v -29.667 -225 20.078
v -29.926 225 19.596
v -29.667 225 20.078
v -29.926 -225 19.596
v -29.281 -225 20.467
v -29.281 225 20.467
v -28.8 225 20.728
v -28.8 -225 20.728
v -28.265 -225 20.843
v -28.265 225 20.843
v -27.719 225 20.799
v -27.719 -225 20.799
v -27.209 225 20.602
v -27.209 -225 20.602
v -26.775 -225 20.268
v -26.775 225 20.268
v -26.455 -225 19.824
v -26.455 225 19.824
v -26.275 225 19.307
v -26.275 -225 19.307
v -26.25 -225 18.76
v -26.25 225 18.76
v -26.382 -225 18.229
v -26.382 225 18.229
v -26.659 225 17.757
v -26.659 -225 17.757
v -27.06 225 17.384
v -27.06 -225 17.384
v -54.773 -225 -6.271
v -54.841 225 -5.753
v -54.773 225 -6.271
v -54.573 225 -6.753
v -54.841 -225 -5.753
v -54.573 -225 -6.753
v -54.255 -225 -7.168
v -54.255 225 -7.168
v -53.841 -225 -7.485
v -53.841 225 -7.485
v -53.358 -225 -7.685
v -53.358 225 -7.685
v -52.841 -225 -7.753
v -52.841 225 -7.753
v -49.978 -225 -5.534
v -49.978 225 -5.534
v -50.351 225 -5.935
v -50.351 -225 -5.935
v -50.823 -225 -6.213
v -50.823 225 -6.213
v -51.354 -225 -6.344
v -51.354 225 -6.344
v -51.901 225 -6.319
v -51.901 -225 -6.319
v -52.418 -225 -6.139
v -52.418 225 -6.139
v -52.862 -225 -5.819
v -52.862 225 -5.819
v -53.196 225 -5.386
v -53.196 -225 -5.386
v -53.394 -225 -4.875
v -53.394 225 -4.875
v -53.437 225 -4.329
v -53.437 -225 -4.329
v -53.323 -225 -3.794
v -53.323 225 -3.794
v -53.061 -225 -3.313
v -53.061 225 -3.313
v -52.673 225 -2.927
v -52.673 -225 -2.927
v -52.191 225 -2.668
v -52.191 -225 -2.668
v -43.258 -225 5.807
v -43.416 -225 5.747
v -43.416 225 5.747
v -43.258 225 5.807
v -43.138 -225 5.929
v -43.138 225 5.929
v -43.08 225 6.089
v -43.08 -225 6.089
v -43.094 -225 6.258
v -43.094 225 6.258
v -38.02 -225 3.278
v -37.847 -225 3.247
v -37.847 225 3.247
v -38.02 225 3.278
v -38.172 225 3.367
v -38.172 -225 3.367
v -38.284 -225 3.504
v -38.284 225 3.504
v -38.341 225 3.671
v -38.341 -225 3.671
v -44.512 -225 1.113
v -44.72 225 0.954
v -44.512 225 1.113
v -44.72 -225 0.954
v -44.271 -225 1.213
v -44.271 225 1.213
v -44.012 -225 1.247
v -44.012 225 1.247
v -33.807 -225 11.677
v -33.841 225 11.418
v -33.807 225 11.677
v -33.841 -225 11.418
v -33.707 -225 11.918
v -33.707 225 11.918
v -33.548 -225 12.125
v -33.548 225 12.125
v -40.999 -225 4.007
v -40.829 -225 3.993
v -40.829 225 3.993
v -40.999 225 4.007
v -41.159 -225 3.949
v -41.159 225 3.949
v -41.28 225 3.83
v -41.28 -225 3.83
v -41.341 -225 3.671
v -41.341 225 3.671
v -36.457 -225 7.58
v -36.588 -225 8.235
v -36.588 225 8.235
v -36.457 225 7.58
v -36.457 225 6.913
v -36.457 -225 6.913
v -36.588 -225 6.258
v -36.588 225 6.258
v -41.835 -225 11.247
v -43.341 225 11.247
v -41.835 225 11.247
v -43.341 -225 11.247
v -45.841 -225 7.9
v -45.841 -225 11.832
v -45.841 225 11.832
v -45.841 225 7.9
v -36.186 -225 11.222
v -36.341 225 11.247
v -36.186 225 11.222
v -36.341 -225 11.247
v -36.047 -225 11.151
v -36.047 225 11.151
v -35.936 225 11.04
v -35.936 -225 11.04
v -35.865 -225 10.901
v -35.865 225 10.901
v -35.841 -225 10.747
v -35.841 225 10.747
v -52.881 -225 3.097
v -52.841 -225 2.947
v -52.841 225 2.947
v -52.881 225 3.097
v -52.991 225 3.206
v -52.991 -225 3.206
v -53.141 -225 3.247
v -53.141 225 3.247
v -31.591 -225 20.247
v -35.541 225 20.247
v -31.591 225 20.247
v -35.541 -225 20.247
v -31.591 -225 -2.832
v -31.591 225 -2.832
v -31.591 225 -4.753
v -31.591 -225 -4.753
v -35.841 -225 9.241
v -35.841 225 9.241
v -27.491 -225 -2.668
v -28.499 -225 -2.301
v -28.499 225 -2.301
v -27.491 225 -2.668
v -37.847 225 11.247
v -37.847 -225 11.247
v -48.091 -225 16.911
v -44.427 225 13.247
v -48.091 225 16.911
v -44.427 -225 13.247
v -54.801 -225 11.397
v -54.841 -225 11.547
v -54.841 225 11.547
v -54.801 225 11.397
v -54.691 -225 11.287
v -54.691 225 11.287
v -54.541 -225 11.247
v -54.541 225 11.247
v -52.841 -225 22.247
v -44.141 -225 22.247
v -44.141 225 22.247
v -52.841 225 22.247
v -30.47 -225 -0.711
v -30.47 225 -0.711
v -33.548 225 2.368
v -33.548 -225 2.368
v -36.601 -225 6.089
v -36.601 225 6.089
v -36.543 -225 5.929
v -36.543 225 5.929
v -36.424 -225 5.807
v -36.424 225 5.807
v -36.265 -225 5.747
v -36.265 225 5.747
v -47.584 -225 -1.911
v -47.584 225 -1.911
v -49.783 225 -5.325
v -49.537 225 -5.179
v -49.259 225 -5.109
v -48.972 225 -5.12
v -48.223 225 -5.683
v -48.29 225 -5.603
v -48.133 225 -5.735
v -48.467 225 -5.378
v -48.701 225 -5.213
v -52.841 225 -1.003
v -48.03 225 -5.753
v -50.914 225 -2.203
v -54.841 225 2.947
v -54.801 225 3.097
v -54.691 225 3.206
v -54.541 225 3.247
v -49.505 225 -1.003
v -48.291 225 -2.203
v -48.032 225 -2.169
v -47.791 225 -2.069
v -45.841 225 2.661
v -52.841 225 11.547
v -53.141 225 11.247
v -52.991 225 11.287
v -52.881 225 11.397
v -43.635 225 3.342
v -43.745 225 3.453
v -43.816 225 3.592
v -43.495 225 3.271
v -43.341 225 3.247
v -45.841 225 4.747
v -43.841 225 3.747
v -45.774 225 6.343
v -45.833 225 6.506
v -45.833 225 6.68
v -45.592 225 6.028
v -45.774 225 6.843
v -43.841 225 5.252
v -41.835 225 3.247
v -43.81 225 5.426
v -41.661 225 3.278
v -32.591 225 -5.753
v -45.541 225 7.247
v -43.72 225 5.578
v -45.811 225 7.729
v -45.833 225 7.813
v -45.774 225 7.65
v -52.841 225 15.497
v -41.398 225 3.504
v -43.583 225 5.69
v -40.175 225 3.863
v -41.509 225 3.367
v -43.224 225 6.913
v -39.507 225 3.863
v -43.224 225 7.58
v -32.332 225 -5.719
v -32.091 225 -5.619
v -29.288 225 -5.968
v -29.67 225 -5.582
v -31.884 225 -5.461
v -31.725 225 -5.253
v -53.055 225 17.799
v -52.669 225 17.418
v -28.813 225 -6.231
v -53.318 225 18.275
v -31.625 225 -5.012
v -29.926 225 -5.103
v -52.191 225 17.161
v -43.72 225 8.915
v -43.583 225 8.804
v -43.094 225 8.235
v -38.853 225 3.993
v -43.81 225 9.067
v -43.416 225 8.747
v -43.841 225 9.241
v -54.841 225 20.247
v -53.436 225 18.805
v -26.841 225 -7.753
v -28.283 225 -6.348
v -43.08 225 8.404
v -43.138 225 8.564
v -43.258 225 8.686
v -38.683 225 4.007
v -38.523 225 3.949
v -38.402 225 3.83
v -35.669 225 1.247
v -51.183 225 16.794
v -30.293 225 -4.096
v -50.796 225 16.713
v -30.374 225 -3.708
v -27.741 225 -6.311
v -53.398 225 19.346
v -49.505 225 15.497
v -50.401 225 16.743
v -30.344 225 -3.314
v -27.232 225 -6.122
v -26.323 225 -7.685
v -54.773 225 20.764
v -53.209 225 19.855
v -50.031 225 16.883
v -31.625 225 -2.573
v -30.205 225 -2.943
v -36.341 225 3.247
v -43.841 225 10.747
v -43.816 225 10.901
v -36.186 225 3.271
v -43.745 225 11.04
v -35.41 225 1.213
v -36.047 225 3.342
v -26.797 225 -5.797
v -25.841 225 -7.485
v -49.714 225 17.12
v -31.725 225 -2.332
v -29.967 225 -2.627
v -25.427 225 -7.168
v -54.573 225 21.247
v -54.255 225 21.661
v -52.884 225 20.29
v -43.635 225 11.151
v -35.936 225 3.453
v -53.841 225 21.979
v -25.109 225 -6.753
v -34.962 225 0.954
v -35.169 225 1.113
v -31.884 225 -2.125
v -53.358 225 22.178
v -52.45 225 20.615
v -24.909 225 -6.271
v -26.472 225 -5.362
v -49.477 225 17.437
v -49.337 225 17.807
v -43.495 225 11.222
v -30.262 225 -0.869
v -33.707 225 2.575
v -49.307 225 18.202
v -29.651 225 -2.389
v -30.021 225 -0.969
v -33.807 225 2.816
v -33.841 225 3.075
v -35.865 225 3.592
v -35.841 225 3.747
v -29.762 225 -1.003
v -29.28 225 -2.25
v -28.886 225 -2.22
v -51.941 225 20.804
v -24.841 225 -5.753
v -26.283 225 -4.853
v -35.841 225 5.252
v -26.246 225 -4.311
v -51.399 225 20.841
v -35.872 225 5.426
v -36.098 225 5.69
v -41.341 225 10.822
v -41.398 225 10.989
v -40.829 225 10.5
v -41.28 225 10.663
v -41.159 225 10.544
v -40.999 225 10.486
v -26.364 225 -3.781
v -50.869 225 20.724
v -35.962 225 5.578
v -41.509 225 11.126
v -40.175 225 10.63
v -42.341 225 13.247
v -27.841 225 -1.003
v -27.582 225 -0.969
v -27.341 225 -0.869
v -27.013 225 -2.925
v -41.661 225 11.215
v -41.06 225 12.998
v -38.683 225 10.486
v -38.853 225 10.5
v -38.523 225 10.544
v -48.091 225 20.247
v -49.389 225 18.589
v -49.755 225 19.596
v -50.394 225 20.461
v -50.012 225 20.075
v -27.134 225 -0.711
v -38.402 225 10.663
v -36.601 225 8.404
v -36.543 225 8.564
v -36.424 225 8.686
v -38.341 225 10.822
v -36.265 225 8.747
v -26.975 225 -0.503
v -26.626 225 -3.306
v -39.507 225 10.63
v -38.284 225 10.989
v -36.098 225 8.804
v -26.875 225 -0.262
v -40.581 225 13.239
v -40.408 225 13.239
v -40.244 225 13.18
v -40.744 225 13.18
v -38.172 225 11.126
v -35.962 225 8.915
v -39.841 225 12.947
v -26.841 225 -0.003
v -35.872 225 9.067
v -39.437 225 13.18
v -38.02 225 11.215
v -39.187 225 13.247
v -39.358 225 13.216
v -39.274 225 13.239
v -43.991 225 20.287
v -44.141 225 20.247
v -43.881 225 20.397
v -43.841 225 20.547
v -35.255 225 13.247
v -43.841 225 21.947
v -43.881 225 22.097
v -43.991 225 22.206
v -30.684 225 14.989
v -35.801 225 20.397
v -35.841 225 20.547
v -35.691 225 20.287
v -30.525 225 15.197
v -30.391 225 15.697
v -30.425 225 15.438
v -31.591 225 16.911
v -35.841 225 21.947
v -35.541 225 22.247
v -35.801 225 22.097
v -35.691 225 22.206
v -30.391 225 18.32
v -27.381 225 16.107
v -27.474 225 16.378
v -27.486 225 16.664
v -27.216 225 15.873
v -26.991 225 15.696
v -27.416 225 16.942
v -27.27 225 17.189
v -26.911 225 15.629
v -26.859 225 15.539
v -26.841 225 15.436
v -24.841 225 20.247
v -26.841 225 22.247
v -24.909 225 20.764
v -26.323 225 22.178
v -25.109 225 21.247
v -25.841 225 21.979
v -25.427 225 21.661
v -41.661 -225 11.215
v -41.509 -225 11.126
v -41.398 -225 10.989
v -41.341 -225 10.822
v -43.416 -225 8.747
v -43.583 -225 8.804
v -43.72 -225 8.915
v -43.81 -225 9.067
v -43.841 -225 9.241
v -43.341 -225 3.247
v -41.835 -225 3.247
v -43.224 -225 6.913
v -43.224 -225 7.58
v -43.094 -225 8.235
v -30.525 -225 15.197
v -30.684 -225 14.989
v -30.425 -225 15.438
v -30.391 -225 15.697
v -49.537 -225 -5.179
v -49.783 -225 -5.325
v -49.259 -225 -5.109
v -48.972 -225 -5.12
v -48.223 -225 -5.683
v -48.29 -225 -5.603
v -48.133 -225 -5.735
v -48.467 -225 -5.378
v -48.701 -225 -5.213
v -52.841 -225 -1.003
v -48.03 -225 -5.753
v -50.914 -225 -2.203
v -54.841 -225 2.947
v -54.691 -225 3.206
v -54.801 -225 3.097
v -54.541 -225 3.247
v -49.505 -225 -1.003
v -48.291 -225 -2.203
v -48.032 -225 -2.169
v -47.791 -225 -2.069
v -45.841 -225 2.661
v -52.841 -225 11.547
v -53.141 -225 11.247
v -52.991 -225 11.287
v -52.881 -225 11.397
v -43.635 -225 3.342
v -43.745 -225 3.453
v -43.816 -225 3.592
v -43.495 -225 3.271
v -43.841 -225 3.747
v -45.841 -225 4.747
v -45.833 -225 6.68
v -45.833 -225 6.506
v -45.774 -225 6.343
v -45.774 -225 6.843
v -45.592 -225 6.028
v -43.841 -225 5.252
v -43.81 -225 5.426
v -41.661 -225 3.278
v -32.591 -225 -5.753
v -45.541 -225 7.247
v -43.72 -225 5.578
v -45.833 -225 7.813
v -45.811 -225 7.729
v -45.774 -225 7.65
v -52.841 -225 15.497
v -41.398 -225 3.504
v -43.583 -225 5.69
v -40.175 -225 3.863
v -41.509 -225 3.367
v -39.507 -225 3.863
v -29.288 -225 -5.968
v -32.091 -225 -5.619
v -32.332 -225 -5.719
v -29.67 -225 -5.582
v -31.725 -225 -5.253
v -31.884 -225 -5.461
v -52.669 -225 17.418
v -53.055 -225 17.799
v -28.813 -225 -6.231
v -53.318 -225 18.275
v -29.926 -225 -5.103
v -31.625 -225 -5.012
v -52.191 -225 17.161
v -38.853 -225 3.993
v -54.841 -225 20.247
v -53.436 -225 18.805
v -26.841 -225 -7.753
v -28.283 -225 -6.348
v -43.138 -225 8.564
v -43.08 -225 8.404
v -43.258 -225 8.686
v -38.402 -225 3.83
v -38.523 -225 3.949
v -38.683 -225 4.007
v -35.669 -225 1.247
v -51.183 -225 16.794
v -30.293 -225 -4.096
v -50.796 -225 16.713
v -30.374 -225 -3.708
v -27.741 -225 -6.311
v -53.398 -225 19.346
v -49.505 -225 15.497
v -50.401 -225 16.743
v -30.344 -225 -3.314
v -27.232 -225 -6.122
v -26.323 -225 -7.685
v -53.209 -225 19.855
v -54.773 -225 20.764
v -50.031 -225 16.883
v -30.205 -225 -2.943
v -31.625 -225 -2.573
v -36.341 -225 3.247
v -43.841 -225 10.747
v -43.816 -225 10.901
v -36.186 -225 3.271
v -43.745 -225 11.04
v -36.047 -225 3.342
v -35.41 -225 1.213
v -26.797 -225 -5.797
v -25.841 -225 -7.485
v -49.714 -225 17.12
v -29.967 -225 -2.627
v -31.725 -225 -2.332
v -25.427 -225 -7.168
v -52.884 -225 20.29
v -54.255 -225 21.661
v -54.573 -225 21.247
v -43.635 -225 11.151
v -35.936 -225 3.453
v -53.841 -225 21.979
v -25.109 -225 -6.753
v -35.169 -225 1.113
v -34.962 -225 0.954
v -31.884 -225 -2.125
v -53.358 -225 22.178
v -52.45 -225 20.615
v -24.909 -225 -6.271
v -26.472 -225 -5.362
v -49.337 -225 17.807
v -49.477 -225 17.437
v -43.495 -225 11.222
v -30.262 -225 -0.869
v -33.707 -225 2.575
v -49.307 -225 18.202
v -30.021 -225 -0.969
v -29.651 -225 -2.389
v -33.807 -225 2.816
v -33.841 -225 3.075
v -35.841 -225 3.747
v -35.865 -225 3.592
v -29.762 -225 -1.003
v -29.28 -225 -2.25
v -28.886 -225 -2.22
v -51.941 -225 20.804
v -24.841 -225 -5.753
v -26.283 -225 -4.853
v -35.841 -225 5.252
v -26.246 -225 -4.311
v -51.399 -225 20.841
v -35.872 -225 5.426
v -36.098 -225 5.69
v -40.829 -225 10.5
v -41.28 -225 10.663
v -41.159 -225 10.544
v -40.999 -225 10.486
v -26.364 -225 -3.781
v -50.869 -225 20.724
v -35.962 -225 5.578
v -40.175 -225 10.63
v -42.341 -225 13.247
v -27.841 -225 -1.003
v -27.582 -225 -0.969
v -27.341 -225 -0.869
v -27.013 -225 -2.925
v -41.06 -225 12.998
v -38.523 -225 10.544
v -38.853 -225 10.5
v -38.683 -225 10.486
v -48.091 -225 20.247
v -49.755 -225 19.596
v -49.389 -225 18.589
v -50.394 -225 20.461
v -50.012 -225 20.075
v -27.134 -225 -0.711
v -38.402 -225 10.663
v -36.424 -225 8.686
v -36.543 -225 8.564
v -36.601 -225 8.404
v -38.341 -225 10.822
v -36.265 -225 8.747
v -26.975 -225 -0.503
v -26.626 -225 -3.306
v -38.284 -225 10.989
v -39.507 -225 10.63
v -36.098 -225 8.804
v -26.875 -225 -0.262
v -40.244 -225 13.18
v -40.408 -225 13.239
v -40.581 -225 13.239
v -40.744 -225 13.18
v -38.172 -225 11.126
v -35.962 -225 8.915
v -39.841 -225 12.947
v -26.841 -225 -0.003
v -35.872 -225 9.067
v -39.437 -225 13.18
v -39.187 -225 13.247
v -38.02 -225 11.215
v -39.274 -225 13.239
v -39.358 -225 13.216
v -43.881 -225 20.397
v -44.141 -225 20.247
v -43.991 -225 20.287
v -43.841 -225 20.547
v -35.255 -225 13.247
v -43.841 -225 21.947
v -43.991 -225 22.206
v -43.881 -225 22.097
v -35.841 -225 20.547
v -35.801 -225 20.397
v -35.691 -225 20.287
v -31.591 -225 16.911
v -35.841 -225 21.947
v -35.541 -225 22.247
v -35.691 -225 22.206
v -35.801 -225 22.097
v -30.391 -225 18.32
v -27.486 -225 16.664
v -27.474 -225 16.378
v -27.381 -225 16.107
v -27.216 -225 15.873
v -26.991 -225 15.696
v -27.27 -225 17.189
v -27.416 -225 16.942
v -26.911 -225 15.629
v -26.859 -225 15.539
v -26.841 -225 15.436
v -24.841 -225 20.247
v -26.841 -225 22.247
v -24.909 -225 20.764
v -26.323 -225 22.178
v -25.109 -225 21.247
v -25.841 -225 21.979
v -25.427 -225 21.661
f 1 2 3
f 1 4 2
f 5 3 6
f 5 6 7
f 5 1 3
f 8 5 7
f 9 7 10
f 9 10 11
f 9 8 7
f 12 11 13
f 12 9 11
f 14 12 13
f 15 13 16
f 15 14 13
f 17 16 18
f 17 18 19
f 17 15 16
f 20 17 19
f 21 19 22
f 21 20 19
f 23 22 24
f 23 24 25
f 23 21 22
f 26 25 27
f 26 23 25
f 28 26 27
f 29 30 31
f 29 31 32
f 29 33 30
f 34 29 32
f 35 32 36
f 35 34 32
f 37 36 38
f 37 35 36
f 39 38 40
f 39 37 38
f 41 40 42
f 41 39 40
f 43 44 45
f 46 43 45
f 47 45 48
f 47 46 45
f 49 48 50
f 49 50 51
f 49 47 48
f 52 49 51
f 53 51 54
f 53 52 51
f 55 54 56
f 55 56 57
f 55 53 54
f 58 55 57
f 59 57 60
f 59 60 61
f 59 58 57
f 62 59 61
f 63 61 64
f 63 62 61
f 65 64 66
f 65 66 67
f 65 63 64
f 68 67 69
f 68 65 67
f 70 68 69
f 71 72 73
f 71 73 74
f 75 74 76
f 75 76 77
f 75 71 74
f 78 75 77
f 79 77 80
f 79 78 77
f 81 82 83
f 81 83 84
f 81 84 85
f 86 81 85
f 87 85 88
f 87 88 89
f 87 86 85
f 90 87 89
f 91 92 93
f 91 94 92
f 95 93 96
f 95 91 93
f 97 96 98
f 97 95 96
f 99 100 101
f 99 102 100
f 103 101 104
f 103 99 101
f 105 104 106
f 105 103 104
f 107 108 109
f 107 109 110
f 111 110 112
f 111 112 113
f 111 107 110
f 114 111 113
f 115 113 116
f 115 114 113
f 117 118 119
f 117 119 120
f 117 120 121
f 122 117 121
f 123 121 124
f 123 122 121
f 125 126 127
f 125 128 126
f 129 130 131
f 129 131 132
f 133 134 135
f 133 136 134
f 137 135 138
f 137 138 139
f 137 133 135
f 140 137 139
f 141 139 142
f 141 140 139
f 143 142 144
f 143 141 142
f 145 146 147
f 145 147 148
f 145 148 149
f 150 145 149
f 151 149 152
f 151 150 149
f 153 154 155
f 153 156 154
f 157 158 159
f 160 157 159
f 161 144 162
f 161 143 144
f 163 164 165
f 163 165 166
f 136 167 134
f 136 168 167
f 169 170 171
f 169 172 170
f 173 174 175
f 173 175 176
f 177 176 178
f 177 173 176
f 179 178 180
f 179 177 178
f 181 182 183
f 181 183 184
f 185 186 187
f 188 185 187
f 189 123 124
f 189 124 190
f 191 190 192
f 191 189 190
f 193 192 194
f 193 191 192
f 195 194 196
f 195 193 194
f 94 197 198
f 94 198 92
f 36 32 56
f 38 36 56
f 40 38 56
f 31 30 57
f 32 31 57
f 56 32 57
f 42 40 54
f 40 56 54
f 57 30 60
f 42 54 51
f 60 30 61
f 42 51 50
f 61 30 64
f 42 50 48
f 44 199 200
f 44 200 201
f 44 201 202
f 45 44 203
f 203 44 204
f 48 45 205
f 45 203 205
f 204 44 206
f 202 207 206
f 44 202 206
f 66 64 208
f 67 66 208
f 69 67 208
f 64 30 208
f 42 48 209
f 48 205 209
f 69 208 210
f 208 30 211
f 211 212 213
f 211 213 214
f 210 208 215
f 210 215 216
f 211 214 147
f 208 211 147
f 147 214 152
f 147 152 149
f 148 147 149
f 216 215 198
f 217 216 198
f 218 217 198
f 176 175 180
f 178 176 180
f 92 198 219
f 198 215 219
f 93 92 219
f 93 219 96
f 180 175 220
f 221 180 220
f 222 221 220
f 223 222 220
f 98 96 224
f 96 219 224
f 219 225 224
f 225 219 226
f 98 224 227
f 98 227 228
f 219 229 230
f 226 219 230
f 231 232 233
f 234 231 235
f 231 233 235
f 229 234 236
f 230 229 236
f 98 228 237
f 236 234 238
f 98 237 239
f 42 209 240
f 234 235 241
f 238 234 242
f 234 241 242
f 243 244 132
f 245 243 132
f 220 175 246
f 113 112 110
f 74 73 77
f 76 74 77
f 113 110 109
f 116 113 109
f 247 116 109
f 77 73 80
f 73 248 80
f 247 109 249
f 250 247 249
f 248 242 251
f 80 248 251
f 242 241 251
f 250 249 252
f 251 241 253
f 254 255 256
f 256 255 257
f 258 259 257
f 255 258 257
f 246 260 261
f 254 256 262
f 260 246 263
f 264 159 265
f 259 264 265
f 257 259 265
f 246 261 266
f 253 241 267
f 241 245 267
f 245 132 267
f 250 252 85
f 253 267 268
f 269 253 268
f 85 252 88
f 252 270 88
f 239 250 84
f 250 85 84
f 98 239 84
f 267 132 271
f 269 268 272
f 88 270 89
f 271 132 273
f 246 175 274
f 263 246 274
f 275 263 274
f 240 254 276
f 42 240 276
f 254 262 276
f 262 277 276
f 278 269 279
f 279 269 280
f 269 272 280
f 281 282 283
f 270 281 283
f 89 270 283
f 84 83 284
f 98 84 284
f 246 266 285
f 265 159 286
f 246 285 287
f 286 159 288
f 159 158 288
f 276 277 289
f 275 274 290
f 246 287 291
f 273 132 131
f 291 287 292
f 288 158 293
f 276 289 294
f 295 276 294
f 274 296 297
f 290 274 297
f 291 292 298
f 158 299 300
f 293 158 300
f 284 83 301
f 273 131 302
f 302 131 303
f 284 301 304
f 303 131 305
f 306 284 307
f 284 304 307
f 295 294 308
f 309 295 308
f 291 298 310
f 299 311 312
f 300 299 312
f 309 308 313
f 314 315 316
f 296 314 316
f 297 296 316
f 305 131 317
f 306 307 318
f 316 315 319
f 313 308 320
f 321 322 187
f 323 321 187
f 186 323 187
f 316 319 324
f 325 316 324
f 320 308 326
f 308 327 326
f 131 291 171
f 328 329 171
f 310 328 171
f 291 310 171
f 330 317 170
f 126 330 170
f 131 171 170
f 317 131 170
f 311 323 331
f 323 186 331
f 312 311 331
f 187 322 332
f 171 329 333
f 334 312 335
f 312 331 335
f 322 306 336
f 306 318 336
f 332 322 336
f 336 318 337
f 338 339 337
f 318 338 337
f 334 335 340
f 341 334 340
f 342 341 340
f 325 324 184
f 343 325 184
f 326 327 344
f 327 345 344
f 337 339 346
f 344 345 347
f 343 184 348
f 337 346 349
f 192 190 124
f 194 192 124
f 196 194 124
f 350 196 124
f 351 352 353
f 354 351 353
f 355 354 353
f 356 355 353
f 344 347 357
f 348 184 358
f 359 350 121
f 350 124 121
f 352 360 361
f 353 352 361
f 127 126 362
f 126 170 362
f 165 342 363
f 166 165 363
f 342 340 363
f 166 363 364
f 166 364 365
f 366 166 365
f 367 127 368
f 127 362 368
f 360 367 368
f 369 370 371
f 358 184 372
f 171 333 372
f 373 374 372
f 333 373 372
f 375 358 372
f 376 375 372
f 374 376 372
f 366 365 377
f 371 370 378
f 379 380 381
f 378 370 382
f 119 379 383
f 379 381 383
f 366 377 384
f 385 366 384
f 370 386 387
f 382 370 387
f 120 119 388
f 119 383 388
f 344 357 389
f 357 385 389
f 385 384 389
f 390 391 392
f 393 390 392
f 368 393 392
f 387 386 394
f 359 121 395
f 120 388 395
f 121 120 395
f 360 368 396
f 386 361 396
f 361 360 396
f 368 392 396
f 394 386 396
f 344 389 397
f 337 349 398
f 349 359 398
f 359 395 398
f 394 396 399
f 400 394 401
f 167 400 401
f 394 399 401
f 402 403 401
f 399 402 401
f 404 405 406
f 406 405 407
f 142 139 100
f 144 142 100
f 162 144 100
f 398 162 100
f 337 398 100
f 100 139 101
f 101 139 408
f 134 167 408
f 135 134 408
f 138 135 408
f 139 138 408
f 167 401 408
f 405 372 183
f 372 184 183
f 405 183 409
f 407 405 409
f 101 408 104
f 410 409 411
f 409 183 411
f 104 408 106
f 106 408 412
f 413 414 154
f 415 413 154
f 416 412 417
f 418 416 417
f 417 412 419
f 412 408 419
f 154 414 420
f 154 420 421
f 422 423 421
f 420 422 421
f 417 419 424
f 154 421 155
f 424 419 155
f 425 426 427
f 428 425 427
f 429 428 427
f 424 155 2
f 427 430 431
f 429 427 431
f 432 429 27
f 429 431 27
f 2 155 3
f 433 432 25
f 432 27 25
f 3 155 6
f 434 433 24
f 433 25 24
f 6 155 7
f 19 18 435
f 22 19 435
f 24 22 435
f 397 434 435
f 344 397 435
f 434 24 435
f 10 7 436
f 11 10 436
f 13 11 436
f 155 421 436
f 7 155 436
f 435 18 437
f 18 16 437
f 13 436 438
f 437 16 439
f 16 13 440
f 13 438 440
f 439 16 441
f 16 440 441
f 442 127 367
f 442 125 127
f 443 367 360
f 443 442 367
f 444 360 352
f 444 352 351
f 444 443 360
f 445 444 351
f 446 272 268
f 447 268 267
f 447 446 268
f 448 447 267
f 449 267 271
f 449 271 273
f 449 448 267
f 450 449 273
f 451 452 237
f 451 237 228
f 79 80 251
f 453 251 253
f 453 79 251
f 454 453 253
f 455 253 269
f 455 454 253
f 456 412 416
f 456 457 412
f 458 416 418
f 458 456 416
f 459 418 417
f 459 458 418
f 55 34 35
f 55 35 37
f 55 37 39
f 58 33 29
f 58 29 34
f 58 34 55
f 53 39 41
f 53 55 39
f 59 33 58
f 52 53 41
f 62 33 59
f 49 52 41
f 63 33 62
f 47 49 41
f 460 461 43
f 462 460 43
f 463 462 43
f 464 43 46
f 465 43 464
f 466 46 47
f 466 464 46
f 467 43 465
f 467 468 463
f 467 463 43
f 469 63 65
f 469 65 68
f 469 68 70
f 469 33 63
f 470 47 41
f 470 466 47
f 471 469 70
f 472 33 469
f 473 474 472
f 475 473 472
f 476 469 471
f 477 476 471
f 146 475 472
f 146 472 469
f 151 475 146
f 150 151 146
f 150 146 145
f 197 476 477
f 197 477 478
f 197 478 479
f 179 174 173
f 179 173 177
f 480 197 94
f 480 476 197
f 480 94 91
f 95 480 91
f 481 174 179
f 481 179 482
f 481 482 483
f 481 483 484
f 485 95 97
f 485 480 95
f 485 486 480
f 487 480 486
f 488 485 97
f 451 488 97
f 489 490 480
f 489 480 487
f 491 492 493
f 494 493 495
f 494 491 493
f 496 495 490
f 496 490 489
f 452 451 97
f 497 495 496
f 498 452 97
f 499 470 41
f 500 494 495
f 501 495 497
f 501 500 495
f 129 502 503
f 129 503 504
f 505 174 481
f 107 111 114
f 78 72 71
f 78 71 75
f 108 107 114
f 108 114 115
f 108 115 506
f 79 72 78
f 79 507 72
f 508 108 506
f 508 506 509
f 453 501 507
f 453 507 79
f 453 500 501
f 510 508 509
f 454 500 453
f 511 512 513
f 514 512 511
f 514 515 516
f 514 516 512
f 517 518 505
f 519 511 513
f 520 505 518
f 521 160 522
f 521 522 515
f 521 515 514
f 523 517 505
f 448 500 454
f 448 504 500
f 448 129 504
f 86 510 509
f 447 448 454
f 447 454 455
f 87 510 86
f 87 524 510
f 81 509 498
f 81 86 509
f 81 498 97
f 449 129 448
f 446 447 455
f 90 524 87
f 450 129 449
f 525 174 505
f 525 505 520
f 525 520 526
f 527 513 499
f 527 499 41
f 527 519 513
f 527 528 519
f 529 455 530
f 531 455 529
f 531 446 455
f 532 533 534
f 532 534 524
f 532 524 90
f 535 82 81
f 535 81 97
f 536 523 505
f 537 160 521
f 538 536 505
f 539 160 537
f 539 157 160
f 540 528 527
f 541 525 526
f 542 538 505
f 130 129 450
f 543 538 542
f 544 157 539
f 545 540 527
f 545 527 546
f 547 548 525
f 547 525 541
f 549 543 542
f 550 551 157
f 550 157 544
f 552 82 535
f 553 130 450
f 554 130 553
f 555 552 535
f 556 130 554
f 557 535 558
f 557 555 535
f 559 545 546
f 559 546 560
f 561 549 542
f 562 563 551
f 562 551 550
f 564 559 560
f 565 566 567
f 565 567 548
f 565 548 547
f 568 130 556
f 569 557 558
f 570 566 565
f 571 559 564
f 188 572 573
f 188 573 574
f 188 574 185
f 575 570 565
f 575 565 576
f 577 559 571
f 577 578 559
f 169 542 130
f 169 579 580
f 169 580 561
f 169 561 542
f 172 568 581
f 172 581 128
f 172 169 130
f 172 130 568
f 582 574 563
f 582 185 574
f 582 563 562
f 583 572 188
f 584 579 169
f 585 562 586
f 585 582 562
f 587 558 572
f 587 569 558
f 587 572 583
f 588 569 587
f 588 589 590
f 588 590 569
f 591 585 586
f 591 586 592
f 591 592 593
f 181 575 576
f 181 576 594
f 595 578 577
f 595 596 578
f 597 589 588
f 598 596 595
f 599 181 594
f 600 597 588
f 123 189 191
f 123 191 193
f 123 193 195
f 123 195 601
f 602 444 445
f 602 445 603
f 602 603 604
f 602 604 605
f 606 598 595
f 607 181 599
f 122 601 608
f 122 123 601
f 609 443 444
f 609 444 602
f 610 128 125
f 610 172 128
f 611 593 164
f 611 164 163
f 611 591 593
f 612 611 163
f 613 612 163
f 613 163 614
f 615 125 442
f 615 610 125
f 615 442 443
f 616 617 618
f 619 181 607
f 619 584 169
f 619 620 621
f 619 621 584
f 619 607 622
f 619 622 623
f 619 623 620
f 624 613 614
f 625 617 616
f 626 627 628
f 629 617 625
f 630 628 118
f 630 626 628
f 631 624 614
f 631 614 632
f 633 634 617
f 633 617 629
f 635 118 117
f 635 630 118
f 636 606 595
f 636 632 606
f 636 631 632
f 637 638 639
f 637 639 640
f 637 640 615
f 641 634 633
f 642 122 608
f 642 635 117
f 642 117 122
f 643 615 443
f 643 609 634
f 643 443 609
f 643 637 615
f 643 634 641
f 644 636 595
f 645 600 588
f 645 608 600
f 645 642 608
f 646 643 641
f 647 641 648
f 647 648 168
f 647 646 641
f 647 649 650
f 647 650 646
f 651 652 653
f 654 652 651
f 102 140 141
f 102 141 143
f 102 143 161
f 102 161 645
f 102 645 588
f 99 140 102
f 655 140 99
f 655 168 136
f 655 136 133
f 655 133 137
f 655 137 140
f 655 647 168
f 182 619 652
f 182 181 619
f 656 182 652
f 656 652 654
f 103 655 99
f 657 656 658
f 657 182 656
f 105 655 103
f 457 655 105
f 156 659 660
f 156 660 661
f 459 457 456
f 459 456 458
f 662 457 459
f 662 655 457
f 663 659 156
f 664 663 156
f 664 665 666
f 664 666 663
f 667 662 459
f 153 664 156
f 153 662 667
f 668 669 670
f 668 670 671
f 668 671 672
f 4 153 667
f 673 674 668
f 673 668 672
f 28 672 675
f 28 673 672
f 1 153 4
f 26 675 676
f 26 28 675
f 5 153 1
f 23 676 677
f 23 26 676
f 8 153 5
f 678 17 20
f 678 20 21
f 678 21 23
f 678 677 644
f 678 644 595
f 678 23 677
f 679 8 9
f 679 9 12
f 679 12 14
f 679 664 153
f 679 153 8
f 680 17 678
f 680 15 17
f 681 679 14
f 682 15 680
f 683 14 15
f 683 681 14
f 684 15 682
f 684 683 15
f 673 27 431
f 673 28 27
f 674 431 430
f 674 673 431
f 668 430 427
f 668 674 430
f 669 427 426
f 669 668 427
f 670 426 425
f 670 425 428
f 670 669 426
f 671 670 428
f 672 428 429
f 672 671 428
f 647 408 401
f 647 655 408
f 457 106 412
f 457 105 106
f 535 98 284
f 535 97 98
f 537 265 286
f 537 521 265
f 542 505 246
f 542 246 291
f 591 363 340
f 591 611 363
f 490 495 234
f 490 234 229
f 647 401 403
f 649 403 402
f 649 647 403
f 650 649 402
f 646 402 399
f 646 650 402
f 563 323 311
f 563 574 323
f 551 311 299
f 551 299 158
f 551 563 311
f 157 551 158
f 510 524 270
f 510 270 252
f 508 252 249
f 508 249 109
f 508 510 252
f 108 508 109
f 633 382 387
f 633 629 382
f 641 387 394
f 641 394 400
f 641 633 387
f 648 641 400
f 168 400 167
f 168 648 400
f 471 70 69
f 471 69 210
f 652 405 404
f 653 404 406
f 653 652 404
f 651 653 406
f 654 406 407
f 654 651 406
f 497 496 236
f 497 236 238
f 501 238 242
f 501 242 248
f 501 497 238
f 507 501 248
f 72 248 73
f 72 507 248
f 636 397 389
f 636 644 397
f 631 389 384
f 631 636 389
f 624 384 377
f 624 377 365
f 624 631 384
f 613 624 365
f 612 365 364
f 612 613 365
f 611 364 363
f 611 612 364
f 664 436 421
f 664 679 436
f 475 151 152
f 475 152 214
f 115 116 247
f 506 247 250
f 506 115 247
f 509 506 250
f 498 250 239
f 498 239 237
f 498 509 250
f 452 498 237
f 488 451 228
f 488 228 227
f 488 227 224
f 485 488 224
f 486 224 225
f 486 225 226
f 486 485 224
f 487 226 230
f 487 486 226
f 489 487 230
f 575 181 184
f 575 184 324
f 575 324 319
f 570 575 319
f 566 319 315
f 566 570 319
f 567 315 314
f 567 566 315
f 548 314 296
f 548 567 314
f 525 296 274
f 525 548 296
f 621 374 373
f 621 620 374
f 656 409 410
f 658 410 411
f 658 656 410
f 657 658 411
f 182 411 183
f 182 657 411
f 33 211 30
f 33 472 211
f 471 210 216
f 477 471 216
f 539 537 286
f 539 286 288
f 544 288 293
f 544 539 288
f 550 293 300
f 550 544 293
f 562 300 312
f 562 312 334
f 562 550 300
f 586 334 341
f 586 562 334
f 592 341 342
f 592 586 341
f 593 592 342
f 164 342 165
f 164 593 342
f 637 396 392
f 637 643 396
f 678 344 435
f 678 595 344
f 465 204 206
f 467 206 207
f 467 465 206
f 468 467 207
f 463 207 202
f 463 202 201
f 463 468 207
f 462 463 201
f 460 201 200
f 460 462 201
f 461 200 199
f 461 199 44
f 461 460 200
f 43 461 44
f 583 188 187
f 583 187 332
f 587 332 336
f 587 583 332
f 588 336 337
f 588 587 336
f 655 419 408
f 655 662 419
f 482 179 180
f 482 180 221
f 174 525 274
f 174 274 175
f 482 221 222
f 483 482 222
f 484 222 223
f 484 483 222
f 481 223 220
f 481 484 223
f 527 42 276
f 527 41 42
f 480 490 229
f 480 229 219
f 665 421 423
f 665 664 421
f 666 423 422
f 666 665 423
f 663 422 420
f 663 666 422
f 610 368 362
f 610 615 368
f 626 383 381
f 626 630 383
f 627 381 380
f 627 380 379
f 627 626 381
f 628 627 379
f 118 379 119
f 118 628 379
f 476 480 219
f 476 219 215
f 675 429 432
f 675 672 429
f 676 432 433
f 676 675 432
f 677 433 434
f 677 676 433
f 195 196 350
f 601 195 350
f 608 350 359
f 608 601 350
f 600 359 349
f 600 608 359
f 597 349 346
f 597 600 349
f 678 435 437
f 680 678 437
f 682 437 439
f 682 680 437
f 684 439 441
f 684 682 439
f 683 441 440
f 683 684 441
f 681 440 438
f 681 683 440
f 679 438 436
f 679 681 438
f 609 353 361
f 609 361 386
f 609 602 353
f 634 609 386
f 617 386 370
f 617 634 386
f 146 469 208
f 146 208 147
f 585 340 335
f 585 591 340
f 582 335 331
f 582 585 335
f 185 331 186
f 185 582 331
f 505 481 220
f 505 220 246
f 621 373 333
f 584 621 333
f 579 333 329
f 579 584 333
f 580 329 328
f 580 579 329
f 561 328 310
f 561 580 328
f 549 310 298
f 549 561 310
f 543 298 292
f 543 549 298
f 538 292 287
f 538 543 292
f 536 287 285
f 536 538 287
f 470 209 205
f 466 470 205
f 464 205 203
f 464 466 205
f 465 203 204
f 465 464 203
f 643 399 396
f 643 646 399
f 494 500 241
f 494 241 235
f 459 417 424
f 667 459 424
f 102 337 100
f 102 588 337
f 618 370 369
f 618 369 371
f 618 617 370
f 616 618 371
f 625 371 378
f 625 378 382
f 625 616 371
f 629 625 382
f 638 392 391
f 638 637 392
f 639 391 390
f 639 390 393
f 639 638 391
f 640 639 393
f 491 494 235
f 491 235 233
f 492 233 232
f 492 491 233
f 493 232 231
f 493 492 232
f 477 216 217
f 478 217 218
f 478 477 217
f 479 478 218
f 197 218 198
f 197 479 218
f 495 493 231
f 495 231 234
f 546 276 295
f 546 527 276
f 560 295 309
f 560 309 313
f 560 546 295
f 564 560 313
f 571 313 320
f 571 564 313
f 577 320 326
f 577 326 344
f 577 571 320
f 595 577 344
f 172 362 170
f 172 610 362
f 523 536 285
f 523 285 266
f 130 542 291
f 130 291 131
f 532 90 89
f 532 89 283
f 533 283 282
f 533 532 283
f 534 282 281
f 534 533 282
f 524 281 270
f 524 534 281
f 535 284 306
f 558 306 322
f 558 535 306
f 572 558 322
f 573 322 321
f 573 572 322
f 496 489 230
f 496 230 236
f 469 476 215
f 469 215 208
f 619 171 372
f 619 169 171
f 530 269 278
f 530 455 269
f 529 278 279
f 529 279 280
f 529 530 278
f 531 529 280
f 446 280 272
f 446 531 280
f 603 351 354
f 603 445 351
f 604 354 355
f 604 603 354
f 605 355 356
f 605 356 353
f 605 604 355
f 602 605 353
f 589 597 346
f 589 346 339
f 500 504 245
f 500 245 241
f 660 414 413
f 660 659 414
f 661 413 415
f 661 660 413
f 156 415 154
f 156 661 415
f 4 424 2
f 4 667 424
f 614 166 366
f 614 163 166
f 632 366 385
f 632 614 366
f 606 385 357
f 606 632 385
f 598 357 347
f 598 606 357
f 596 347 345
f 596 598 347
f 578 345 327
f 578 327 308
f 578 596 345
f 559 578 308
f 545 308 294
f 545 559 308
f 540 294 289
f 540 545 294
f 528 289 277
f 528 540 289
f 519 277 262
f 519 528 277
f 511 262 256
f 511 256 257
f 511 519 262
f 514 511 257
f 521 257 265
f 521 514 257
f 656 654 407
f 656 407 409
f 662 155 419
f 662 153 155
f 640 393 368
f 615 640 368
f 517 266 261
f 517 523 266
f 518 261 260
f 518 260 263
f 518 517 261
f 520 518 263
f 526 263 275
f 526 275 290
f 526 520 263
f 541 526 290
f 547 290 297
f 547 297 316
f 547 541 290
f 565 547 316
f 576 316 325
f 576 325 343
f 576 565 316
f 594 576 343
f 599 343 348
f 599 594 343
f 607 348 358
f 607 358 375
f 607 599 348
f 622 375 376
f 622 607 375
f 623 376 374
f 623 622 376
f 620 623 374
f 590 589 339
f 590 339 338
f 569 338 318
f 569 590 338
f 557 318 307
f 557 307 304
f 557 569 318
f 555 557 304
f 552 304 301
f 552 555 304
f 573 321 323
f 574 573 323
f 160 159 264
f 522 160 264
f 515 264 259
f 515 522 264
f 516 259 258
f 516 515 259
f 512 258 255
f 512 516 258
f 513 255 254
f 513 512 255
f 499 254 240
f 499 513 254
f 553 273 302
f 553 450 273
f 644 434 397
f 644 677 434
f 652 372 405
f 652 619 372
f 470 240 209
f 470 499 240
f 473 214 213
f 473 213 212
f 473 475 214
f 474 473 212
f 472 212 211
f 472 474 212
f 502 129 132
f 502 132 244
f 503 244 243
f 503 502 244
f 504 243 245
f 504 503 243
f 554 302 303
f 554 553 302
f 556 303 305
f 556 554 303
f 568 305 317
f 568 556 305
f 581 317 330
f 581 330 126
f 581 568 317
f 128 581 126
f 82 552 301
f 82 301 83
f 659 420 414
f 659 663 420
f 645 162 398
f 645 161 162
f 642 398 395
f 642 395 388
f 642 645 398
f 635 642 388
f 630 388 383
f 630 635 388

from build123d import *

# Parameters (mm, degrees)
F2_DEPTH = 225


# Not quite as in the source:
# - ends of sketch curves that miss each other by under 0.0002 mm in the source are joined


with BuildPart() as f2:
    # F1 (on Front) → F2 (new body, symmetric)
    with BuildSketch(Plane.XZ):
        with BuildLine():
            Line((-48.090856, 20.246586), (-44.140856, 20.246586))
            ThreePointArc((-44.140856, 20.246586), (-43.9287239656, 20.3344539656), (-43.840856, 20.546586))
            Line((-43.840856, 20.546586), (-43.840856, 21.946586))
            ThreePointArc((-43.840856, 21.946586), (-43.9287239656, 22.1587180344), (-44.140856, 22.246586))
            Line((-44.140856, 22.246586), (-52.840856, 22.246586))
            ThreePointArc((-52.840856, 22.246586), (-54.2550695624, 21.6607995624), (-54.840856, 20.246586))
            Line((-54.840856, 20.246586), (-54.840856, 11.546586))
            ThreePointArc((-54.840856, 11.546586), (-54.7529880344, 11.3344539656), (-54.540856, 11.246586))
            Line((-54.540856, 11.246586), (-53.140856, 11.246586))
            ThreePointArc((-53.140856, 11.246586), (-52.9287239656, 11.3344539656), (-52.840856, 11.546586))
            Line((-52.840856, 11.546586), (-52.840856, 15.496586))
            Line((-52.840856, 15.496586), (-49.50507, 15.496586))
            Line((-49.50507, 15.496586), (-45.840856, 11.832372))
            Line((-45.840856, 11.832372), (-45.840856, 7.900176))
            ThreePointArc((-45.840856, 7.900176), (-45.8238189324, 7.7707665494), (-45.7738687764, 7.6501761291))
            Line((-45.7738687764, 7.6501761291), (-45.540856, 7.246586))
            Line((-45.540856, 7.246586), (-45.773869, 6.842996))
            ThreePointArc((-45.773869, 6.842996), (-45.840856, 6.592996), (-45.7738687764, 6.3429961291))
            Line((-45.7738687764, 6.3429961291), (-45.591833, 6.0277))
            Line((-45.591833, 6.0277), (-45.840856, 4.746586))
            Line((-45.840856, 4.746586), (-45.840856, 2.6608))
            Line((-45.840856, 2.6608), (-49.50507, -1.003414))
            Line((-49.50507, -1.003414), (-52.840856, -1.003414))
            Line((-52.840856, -1.003414), (-52.840856, 2.946586))
            ThreePointArc((-52.840856, 2.946586), (-52.9287239656, 3.1587180344), (-53.140856, 3.246586))
            Line((-53.140856, 3.246586), (-54.540856, 3.246586))
            ThreePointArc((-54.540856, 3.246586), (-54.7529880344, 3.1587180344), (-54.840856, 2.946586))
            Line((-54.840856, 2.946586), (-54.840856, -5.753414))
            ThreePointArc((-54.840856, -5.753414), (-54.2550695624, -7.1676275624), (-52.840856, -7.753414))
            Line((-52.840856, -7.753414), (-26.840856, -7.753414))
            ThreePointArc((-26.840856, -7.753414), (-25.4266424376, -7.1676275624), (-24.840856, -5.753414))
            Line((-24.840856, -5.753414), (-24.840856, 20.246586))
            ThreePointArc((-24.840856, 20.246586), (-25.4266424376, 21.6607995624), (-26.840856, 22.246586))
            Line((-26.840856, 22.246586), (-35.540856, 22.246586))
            ThreePointArc((-35.540856, 22.246586), (-35.7529880344, 22.1587180344), (-35.840856, 21.946586))
            Line((-35.840856, 21.946586), (-35.840856, 20.546586))
            ThreePointArc((-35.840856, 20.546586), (-35.7529880344, 20.3344539656), (-35.540856, 20.246586))
            Line((-35.540856, 20.246586), (-31.590856, 20.246586))
            Line((-31.590856, 20.246586), (-31.590856, 16.9108))
            Line((-31.590856, 16.9108), (-35.25507, 13.246586))
            Line((-35.25507, 13.246586), (-39.187266, 13.246586))
            ThreePointArc((-39.187266, 13.246586), (-39.3166754506, 13.2295489324), (-39.4372658709, 13.1795987764))
            Line((-39.4372658709, 13.1795987764), (-39.840856, 12.946586))
            Line((-39.840856, 12.946586), (-40.244446, 13.179599))
            ThreePointArc((-40.244446, 13.179599), (-40.494446, 13.246586), (-40.7444458709, 13.1795987764))
            Line((-40.7444458709, 13.1795987764), (-41.059742, 12.997563))
            Line((-41.059742, 12.997563), (-42.340856, 13.246586))
            Line((-42.340856, 13.246586), (-44.426642, 13.246586))
            Line((-44.426642, 13.246586), (-48.090856, 16.9108))
            Line((-48.090856, 16.9108), (-48.090856, 20.246586))
        make_face()
        with BuildLine():
            ThreePointArc((-48.030175, -5.753414), (-48.180175082, -5.7132215738), (-48.2899827159, -5.6034138359))
            ThreePointArc((-48.2899827159, -5.6034138359), (-49.1151948384, -5.1042472042), (-49.9783690315, -5.5344479782))
            ThreePointArc((-49.9783690315, -5.5344479782), (-53.0449723505, -5.6142903949), (-52.1906940253, -2.6679979306))
            Line((-52.1906940253, -2.6679979306), (-50.91426, -2.203414))
            Line((-50.91426, -2.203414), (-48.290856, -2.203414))
            ThreePointArc((-48.290856, -2.203414), (-47.9081725676, -2.1272935325), (-47.5837492188, -1.9105207812))
            Line((-47.5837492188, -1.9105207812), (-44.719536, 0.953693))
            ThreePointArc((-44.719536, 0.953693), (-44.3951124324, 1.1704655325), (-44.012429, 1.246586))
            Line((-44.012429, 1.246586), (-35.669283, 1.246586))
            ThreePointArc((-35.669283, 1.246586), (-35.2865995676, 1.1704655325), (-34.9621762188, 0.9536927812))
            Line((-34.9621762188, 0.9536927812), (-31.883749, -2.124734))
            ThreePointArc((-31.883749, -2.124734), (-31.6669764675, -2.4491575676), (-31.590856, -2.831841))
            Line((-31.590856, -2.831841), (-31.590856, -4.753414))
            ThreePointArc((-31.590856, -4.753414), (-31.8837492188, -5.4605207812), (-32.590856, -5.753414))
            Line((-32.590856, -5.753414), (-48.030175, -5.753414))
        make_face(mode=Mode.SUBTRACT)
        with BuildLine():
            ThreePointArc((-30.2930043339, -4.0956641215), (-29.9673844937, -2.6268855063), (-28.4986058785, -2.3012656661))
            Line((-28.4986058785, -2.3012656661), (-27.491018, -2.667998))
            ThreePointArc((-27.491018, -2.667998), (-26.7973531157, -5.7969168843), (-29.9262720694, -5.1032520253))
            Line((-29.9262720694, -5.1032520253), (-30.2930043339, -4.0956641215))
        make_face(mode=Mode.SUBTRACT)
        with BuildLine():
            ThreePointArc((-36.5876690145, 8.2349049956), (-36.440856, 7.246586), (-36.5876690145, 6.2582670044))
            ThreePointArc((-36.5876690145, 6.2582670044), (-36.5433888407, 5.9288023569), (-36.2653470651, 5.7465855742))
            ThreePointArc((-36.2653470651, 5.7465855742), (-35.9615444769, 5.5780848975), (-35.840856, 5.25232))
            Line((-35.840856, 5.25232), (-35.840856, 3.746586))
            ThreePointArc((-35.840856, 3.746586), (-35.9873026094, 3.3930326094), (-36.340856, 3.246586))
            Line((-36.340856, 3.246586), (-37.84659, 3.246586))
            ThreePointArc((-37.84659, 3.246586), (-38.1723548975, 3.3672744769), (-38.3408555178, 3.6710770737))
            ThreePointArc((-38.3408555178, 3.6710770737), (-38.5230723569, 3.9491188407), (-38.8525409519, 3.9933978415))
            ThreePointArc((-38.8525409519, 3.9933978415), (-39.840856, 3.846586), (-40.8291749956, 3.9933990145))
            ThreePointArc((-40.8291749956, 3.9933990145), (-41.1586396431, 3.9491188407), (-41.3408564258, 3.6710770651))
            ThreePointArc((-41.3408564258, 3.6710770651), (-41.5093571025, 3.3672744769), (-41.835122, 3.246586))
            Line((-41.835122, 3.246586), (-43.340856, 3.246586))
            ThreePointArc((-43.340856, 3.246586), (-43.6944093906, 3.3930326094), (-43.840856, 3.746586))
            Line((-43.840856, 3.746586), (-43.840856, 5.25232))
            ThreePointArc((-43.840856, 5.25232), (-43.7201675231, 5.5780848975), (-43.4163649263, 5.7465855178))
            ThreePointArc((-43.4163649263, 5.7465855178), (-43.1383231593, 5.9288023569), (-43.0940441585, 6.2582709519))
            ThreePointArc((-43.0940441585, 6.2582709519), (-43.240856, 7.246586), (-43.0940429855, 8.2349049956))
            ThreePointArc((-43.0940429855, 8.2349049956), (-43.1383231593, 8.5643696431), (-43.4163649349, 8.7465864258))
            ThreePointArc((-43.4163649349, 8.7465864258), (-43.7201675231, 8.9150871025), (-43.840856, 9.240852))
            Line((-43.840856, 9.240852), (-43.840856, 10.746586))
            ThreePointArc((-43.840856, 10.746586), (-43.6944093906, 11.1001393906), (-43.340856, 11.246586))
            Line((-43.340856, 11.246586), (-41.835122, 11.246586))
            ThreePointArc((-41.835122, 11.246586), (-41.5093571025, 11.1258975231), (-41.3408564822, 10.8220949263))
            ThreePointArc((-41.3408564822, 10.8220949263), (-41.1586396431, 10.5440531593), (-40.8291710481, 10.4997741585))
            ThreePointArc((-40.8291710481, 10.4997741585), (-39.840856, 10.646586), (-38.8525370044, 10.4997729855))
            ThreePointArc((-38.8525370044, 10.4997729855), (-38.5230723569, 10.5440531593), (-38.3408555742, 10.8220949349))
            ThreePointArc((-38.3408555742, 10.8220949349), (-38.1723548975, 11.1258975231), (-37.84659, 11.246586))
            Line((-37.84659, 11.246586), (-36.340856, 11.246586))
            ThreePointArc((-36.340856, 11.246586), (-35.9873026094, 11.1001393906), (-35.840856, 10.746586))
            Line((-35.840856, 10.746586), (-35.840856, 9.240852))
            ThreePointArc((-35.840856, 9.240852), (-35.9615444769, 8.9150871025), (-36.2653470737, 8.7465864822))
            ThreePointArc((-36.2653470737, 8.7465864822), (-36.5433888407, 8.5643696431), (-36.5876690145, 8.2349049956))
        make_face(mode=Mode.SUBTRACT)
        with BuildLine():
            ThreePointArc((-49.3887076661, 18.5888361215), (-49.7143275063, 17.1200575063), (-51.1831061215, 16.7944376661))
            Line((-51.1831061215, 16.7944376661), (-52.190694, 17.16117))
            ThreePointArc((-52.190694, 17.16117), (-52.8843588843, 20.2900888843), (-49.7554399306, 19.5964240253))
            Line((-49.7554399306, 19.5964240253), (-49.3887076661, 18.5888361215))
        make_face(mode=Mode.SUBTRACT)
        with BuildLine():
            ThreePointArc((-33.5479627812, 2.3679062188), (-33.7647355325, 2.6923295676), (-33.840856, 3.075013))
            Line((-33.840856, 3.075013), (-33.840856, 11.418159))
            ThreePointArc((-33.840856, 11.418159), (-33.7647355325, 11.8008424324), (-33.5479627812, 12.1252657812))
            Line((-33.5479627812, 12.1252657812), (-30.683749, 14.989479))
            ThreePointArc((-30.683749, 14.989479), (-30.4669764675, 15.3139025676), (-30.390856, 15.696586))
            Line((-30.390856, 15.696586), (-30.390856, 18.31999))
            Line((-30.390856, 18.31999), (-29.926272, 19.596424))
            ThreePointArc((-29.926272, 19.596424), (-26.9799796051, 20.4507023505), (-27.0598220201, 17.3840990291))
            ThreePointArc((-27.0598220201, 17.3840990291), (-27.4900227958, 16.5209248384), (-26.9908561748, 15.6957126972))
            ThreePointArc((-26.9908561748, 15.6957126972), (-26.8810484262, 15.585905082), (-26.840856, 15.435905))
            Line((-26.840856, 15.435905), (-26.840856, -0.003414))
            ThreePointArc((-26.840856, -0.003414), (-27.1337492188, -0.7105207812), (-27.840856, -1.003414))
            Line((-27.840856, -1.003414), (-29.762429, -1.003414))
            ThreePointArc((-29.762429, -1.003414), (-30.1451124324, -0.9272935325), (-30.4695357812, -0.7105207812))
            Line((-30.4695357812, -0.7105207812), (-33.5479627812, 2.3679062188))
        make_face(mode=Mode.SUBTRACT)
    extrude(amount=F2_DEPTH, both=True)


solid = f2.part
